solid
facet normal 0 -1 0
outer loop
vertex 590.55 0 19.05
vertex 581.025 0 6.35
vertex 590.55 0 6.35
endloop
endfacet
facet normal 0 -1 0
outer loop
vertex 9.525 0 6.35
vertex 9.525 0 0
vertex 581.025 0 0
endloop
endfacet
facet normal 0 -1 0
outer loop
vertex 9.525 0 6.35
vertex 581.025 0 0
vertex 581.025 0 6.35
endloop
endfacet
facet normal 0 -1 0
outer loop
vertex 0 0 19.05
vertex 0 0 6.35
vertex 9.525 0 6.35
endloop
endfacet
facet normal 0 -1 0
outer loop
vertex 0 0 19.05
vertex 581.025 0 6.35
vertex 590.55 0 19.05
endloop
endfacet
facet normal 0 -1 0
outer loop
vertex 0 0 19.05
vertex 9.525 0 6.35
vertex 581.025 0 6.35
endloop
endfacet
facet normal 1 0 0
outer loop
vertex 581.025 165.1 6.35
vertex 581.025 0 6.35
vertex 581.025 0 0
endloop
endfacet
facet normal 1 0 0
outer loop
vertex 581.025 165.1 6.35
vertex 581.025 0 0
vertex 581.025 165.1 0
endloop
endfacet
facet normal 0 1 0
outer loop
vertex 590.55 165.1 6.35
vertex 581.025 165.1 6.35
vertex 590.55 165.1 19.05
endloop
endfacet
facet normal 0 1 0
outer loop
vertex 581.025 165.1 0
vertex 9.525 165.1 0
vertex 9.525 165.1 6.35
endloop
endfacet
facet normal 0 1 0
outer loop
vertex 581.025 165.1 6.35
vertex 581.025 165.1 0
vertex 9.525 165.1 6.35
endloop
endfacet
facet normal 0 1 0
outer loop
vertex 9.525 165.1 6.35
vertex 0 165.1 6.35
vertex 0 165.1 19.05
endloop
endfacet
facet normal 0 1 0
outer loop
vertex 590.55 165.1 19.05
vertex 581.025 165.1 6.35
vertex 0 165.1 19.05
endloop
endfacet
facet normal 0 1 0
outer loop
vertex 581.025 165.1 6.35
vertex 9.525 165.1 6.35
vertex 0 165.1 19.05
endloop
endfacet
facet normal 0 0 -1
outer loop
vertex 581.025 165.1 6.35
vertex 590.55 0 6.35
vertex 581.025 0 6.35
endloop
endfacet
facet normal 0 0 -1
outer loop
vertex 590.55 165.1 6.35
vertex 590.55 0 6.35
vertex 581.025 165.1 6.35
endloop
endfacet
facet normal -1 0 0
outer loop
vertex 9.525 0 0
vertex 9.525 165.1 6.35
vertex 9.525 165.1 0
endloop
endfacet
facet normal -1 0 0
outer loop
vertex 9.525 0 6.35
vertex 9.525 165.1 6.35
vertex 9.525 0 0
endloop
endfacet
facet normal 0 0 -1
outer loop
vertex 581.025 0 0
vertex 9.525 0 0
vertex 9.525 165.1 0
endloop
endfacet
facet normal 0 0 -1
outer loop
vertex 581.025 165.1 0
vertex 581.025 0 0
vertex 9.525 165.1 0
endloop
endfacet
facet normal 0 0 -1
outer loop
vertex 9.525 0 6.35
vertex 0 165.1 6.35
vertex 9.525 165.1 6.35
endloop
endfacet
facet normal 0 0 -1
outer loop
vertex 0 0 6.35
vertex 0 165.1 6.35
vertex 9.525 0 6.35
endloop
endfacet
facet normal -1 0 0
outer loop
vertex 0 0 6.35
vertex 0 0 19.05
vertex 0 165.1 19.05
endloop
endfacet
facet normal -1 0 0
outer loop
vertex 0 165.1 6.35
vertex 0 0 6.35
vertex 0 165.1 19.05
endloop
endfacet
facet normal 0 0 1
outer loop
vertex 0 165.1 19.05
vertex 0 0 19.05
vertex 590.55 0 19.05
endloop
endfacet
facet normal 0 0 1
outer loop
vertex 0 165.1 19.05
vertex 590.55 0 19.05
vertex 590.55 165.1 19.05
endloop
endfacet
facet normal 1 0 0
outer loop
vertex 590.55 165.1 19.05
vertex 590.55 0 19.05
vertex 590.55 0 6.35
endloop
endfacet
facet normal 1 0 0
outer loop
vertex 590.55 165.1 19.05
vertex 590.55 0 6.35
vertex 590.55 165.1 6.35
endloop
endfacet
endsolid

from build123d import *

# Parameters (mm, degrees)
F0_W     = 165.1
F0_H     = 19.05
F1_DEPTH = 590.55
F2_W     = 165.1
F2_H     = 6.35
F3_DEPTH = 9.525
F4_W     = 165.1
F4_H     = 6.35
F5_DEPTH = 9.525


with BuildPart() as f1:
    # F0 (on Right) → F1 (new body)
    with BuildSketch(Plane.YZ):
        with Locations((82.55, 9.525)):
            Rectangle(F0_W, F0_H)
    extrude(amount=F1_DEPTH)

    # F2 (on face) → F3 (cut)
    with BuildSketch(Plane.YZ.offset(590.55)):
        with Locations((82.55, 3.175)):
            Rectangle(F2_W, F2_H)
    extrude(amount=-F3_DEPTH, mode=Mode.SUBTRACT)

    # F4 (on face) → F5 (cut)
    with BuildSketch(Plane(origin=(0, 0, 0), x_dir=(0, -1, 0), z_dir=(-1, 0, 0))):
        with Locations((-82.55, 3.175)):
            Rectangle(F4_W, F4_H)
    extrude(amount=-F5_DEPTH, mode=Mode.SUBTRACT)


solid = f1.part
